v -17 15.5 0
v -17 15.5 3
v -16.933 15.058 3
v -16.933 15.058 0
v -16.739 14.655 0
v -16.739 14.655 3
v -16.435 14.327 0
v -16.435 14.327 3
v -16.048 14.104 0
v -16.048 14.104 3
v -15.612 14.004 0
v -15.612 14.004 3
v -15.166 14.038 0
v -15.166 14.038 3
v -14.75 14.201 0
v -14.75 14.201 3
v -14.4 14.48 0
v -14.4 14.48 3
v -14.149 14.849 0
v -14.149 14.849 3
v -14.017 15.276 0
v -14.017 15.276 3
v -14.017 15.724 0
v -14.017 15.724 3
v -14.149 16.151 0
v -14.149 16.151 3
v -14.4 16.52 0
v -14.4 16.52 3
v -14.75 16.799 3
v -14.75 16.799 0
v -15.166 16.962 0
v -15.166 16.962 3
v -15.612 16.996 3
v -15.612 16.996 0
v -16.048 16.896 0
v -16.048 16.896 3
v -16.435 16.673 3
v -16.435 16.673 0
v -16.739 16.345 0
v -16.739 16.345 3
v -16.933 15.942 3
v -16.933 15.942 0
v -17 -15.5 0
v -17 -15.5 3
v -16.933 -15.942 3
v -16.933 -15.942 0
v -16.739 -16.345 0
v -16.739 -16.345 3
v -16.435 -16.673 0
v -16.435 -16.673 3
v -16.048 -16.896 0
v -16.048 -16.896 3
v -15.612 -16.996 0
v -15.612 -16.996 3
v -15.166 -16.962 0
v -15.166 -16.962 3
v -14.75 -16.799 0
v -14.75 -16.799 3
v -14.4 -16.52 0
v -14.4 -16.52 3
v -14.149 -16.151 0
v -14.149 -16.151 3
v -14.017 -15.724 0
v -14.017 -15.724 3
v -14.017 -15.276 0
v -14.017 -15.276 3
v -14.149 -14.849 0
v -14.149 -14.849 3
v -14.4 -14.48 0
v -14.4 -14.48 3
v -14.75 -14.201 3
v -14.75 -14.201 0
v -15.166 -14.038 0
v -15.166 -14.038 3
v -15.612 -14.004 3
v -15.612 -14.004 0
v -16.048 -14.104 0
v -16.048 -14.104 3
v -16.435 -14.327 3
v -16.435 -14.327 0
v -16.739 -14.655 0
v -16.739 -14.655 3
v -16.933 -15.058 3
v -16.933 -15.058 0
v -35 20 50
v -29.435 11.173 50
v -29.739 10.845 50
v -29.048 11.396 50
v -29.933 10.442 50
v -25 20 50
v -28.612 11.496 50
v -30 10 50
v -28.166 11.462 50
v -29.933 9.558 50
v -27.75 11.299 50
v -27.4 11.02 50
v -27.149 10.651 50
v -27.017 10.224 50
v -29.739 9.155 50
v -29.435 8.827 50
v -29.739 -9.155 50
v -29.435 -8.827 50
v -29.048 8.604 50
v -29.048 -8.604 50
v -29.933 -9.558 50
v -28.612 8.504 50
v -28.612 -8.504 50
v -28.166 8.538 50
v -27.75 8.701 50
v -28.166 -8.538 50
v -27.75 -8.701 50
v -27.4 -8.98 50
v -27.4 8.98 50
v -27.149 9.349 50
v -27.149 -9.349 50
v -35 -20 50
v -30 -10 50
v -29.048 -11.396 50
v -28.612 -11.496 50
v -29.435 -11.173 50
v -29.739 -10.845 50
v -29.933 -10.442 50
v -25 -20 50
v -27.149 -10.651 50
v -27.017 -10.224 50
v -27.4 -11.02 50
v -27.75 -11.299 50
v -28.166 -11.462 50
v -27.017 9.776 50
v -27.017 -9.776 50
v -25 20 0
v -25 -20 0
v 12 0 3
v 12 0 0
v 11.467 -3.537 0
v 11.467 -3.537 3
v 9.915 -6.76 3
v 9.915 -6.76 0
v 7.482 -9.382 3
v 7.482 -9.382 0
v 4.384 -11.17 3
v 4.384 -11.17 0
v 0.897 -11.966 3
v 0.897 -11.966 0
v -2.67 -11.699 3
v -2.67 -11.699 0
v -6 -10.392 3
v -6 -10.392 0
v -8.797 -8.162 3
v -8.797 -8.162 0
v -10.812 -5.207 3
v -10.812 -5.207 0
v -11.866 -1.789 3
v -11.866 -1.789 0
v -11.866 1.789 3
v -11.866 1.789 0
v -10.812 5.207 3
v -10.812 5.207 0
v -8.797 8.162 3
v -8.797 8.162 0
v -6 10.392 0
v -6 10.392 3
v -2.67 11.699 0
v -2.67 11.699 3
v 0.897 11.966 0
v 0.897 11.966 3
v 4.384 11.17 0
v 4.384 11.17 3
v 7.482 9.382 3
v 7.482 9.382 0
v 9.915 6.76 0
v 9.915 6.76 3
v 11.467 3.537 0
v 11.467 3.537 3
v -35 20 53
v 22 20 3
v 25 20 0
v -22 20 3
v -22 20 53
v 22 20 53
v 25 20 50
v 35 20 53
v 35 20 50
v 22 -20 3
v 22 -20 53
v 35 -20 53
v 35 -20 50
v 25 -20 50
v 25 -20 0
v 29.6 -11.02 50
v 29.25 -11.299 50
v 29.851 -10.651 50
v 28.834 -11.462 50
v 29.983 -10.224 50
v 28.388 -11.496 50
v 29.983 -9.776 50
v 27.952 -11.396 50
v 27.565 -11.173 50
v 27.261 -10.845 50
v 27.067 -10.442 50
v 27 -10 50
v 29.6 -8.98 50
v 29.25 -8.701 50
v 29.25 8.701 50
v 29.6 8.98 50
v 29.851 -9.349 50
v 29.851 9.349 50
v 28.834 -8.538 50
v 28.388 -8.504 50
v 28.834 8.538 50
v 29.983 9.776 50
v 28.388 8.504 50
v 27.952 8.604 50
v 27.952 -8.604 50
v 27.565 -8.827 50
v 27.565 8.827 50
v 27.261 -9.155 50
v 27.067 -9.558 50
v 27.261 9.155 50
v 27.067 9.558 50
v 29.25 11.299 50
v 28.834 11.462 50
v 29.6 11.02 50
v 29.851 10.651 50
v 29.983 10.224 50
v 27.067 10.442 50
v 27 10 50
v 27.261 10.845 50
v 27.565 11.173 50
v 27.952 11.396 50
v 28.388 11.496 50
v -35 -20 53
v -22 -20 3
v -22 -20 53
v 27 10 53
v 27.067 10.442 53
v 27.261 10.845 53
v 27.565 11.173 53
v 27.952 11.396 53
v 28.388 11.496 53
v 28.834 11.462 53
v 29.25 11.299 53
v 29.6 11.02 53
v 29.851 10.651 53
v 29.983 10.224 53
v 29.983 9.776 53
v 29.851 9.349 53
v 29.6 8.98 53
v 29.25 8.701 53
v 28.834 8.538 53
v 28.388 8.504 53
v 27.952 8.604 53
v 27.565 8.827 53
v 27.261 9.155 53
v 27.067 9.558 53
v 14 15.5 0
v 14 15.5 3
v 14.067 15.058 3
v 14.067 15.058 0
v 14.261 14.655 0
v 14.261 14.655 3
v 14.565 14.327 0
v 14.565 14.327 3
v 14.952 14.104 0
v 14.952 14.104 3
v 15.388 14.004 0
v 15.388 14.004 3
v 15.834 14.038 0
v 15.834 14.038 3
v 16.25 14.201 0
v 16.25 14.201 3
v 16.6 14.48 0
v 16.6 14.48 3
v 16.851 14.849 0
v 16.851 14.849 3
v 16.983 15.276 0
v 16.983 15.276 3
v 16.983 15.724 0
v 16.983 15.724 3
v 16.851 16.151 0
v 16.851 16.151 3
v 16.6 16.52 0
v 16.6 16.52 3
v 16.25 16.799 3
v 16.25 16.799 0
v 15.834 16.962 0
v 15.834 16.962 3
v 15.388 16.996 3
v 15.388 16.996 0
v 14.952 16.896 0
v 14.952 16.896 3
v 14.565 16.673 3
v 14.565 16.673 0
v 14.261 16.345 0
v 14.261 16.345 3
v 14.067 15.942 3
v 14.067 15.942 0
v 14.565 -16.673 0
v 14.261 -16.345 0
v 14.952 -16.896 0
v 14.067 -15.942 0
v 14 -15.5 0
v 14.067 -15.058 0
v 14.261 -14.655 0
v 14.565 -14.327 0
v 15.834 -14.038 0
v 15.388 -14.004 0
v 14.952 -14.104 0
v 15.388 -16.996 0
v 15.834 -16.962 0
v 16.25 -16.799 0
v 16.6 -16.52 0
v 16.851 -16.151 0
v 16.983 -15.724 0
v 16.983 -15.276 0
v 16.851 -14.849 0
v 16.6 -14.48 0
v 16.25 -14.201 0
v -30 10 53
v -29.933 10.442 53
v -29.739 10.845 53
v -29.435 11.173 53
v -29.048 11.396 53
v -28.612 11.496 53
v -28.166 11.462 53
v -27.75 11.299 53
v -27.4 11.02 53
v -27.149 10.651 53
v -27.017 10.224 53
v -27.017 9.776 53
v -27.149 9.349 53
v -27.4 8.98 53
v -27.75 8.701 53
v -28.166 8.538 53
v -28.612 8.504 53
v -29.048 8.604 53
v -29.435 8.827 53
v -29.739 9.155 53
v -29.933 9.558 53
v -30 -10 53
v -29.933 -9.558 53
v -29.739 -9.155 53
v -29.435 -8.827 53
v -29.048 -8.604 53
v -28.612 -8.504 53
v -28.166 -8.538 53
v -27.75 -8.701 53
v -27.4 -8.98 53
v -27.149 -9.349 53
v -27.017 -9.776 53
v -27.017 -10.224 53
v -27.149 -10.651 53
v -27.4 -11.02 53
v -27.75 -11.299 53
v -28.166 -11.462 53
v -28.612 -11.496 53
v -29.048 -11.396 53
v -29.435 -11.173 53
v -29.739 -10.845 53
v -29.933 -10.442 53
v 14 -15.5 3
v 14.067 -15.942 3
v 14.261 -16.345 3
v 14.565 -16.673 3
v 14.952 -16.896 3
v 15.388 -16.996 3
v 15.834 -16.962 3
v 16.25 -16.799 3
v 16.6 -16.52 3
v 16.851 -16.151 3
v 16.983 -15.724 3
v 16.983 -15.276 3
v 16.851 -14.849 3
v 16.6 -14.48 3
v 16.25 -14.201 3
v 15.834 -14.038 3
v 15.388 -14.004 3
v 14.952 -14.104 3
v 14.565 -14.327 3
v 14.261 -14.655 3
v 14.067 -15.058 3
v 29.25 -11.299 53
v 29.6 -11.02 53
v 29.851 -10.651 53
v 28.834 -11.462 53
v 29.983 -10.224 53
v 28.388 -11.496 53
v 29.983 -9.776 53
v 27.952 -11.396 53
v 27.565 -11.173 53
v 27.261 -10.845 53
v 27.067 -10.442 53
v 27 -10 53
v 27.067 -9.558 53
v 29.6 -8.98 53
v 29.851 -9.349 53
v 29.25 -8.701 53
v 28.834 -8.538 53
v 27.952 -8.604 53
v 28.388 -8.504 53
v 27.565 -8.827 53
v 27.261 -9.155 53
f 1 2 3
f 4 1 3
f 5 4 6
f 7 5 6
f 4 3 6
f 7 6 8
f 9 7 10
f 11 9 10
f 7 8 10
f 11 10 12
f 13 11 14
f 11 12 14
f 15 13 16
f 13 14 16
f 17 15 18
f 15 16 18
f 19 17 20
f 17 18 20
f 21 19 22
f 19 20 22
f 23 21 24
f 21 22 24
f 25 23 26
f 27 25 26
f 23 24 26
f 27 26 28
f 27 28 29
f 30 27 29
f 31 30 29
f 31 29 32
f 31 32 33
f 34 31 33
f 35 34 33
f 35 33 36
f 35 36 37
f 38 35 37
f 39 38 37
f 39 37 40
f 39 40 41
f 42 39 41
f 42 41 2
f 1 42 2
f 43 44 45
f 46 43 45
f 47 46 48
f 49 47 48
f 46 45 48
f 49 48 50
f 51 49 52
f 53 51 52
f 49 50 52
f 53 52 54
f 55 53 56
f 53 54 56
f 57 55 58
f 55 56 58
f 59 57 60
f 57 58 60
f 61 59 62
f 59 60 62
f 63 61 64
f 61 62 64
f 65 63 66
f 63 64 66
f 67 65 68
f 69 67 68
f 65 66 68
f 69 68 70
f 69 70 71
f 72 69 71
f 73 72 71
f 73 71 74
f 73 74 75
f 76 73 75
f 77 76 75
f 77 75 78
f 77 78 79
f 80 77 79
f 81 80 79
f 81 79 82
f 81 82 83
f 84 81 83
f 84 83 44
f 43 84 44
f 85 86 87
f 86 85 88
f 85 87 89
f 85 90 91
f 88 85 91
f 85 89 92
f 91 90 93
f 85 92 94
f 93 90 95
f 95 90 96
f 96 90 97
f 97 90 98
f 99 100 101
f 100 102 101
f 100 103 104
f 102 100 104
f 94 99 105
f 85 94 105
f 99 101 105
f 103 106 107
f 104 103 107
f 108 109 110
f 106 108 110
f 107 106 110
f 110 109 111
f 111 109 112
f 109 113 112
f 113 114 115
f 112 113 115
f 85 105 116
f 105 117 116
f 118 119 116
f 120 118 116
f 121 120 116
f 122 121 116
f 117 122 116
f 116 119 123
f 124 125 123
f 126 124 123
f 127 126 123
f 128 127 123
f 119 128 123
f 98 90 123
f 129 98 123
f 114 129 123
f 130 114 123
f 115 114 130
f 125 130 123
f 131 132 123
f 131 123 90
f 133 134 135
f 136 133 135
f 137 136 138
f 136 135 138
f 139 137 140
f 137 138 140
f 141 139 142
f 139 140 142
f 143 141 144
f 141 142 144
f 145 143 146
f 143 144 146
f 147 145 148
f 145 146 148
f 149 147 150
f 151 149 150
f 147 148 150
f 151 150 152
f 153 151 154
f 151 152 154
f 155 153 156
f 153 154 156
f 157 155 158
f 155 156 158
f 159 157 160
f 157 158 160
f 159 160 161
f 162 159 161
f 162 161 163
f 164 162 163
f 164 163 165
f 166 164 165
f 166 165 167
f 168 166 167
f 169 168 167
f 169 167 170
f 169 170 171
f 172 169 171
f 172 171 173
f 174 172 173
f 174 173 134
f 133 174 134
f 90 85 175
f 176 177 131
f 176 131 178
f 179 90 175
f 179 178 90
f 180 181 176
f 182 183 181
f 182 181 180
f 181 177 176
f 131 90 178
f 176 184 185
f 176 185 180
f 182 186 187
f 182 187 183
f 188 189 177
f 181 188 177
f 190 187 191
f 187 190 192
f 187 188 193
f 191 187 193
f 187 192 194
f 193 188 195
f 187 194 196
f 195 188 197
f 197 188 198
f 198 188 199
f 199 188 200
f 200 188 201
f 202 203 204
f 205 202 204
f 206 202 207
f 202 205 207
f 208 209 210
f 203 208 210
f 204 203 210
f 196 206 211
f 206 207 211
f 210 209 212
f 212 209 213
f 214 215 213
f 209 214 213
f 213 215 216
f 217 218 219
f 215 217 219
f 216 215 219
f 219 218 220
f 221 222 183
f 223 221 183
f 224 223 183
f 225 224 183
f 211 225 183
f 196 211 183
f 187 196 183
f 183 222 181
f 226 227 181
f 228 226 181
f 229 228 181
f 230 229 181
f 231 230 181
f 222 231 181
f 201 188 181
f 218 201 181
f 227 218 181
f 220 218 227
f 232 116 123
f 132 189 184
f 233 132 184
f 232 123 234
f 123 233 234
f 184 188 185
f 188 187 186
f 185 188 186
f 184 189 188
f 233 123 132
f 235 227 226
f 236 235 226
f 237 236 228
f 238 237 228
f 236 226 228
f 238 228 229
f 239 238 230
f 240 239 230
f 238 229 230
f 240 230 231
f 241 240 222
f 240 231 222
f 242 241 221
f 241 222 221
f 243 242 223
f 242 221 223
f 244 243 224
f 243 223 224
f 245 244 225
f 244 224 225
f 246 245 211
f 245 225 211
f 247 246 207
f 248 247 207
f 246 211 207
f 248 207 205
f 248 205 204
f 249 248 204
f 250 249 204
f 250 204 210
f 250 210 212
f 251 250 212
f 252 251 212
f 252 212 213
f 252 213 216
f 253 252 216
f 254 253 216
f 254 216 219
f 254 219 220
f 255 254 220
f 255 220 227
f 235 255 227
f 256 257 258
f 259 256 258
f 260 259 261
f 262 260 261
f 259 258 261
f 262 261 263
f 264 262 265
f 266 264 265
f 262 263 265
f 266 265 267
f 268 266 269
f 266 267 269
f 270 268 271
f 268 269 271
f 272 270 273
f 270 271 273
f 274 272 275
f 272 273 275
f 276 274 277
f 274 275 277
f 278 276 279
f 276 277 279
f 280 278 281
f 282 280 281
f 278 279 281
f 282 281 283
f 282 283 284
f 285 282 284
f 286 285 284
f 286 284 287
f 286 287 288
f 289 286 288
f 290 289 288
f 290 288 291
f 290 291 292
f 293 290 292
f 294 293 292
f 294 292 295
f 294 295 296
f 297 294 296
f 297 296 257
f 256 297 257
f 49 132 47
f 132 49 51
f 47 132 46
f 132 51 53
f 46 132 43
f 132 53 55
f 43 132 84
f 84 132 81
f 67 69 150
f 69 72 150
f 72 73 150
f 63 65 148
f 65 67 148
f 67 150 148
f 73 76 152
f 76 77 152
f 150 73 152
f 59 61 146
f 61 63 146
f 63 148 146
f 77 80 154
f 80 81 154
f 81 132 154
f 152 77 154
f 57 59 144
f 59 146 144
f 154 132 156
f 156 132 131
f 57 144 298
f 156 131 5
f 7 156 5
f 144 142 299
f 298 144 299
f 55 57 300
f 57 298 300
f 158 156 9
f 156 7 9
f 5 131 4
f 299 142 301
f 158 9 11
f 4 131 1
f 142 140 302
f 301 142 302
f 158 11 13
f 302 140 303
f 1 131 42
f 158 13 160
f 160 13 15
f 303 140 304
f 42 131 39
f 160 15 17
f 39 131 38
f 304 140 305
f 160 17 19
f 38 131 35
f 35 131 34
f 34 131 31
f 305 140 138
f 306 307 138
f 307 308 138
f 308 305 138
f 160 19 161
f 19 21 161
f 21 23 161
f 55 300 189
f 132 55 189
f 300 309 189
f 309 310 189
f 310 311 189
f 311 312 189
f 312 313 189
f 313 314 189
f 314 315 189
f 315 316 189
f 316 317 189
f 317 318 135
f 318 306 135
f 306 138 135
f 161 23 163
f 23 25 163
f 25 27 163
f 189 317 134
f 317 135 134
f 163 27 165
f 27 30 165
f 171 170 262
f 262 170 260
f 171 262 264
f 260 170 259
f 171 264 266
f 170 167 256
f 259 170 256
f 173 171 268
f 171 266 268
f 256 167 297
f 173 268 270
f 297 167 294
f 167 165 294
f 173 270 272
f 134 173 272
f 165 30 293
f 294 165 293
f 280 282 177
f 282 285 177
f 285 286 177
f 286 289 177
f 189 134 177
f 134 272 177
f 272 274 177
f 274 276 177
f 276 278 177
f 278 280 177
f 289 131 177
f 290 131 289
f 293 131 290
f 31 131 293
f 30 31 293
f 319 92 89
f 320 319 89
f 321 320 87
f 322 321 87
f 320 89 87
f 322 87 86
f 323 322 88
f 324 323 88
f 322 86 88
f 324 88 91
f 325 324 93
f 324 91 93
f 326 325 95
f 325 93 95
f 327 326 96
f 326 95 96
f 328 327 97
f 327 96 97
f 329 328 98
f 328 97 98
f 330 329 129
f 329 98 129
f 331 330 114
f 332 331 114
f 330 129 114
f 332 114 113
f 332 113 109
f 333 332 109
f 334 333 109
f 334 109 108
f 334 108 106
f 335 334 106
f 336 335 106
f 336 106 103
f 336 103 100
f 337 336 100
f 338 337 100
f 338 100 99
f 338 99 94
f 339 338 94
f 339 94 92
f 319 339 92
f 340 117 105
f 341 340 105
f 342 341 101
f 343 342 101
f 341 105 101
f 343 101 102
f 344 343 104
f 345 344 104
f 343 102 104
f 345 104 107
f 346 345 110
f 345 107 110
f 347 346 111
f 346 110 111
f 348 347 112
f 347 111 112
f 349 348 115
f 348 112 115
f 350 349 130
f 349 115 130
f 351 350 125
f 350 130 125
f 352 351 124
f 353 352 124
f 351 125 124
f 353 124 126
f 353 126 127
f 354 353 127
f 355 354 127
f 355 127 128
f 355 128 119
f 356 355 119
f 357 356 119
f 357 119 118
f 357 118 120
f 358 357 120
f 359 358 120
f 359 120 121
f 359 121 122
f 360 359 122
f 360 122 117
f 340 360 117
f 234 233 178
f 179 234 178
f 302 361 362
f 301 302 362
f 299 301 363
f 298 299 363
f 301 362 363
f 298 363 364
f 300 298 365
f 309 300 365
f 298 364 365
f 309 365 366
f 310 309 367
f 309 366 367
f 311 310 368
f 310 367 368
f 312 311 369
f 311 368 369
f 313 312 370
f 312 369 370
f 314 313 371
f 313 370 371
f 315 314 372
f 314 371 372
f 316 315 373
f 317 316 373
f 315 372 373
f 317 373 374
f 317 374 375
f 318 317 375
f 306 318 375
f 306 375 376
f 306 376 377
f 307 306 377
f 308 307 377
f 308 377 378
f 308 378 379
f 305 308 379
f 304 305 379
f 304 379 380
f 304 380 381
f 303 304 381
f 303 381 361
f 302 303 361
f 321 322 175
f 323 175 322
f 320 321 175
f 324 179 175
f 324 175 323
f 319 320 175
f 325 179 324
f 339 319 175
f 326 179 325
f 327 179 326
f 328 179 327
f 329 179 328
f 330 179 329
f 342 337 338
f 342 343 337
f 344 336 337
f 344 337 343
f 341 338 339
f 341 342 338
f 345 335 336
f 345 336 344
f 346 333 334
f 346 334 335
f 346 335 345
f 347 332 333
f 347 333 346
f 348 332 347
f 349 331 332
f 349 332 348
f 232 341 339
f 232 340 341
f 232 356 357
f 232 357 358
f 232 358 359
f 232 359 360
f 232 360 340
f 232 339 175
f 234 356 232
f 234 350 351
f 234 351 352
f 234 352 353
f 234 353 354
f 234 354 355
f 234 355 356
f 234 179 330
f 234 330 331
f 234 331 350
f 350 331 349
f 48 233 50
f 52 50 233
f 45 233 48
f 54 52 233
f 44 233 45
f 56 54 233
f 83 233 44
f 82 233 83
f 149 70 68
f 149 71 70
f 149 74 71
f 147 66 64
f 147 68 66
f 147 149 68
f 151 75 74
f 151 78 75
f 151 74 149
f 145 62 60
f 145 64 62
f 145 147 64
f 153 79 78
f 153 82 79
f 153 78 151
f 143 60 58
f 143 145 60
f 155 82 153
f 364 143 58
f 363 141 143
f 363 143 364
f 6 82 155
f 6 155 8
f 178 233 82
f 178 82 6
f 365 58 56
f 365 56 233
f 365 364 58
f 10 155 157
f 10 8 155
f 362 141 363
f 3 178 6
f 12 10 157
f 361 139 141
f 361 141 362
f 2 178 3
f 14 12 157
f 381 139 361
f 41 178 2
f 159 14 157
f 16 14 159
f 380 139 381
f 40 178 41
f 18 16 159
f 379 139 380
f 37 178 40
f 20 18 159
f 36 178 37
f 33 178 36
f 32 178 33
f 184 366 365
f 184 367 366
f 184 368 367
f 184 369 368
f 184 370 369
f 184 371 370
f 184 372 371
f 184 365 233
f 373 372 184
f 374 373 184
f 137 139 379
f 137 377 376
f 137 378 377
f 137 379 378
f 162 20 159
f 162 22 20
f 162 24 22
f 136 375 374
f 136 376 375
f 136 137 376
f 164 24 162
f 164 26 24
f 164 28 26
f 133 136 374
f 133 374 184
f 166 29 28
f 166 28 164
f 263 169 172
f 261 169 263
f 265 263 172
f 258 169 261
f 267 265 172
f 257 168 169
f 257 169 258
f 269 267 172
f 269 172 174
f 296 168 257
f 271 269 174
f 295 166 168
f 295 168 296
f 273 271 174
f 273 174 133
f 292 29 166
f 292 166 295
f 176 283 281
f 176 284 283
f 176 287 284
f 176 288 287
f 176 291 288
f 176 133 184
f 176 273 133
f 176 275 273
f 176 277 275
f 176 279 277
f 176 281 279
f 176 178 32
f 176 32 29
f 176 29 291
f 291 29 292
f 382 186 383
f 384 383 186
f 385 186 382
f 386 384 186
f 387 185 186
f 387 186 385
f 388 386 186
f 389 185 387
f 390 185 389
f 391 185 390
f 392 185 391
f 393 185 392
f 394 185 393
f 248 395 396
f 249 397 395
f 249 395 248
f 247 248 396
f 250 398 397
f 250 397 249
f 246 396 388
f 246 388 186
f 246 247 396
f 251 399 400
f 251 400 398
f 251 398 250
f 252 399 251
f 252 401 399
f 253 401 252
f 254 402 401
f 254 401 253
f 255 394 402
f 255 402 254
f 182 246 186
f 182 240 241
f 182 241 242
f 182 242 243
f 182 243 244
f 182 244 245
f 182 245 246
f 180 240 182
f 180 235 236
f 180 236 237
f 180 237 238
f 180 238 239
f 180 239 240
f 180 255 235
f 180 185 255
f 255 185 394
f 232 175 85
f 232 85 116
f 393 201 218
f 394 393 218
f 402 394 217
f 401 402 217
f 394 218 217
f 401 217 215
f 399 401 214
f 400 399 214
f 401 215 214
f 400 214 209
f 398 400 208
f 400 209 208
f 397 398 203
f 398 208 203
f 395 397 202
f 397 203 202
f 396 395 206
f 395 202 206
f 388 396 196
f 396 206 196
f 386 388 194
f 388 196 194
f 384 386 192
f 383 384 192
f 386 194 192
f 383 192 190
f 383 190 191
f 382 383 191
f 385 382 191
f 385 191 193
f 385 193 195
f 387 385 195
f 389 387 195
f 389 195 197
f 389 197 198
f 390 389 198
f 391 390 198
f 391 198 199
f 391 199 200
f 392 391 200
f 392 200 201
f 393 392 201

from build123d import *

# Parameters (mm, degrees)
F0_W      = 50
F0_H      = 40
F1_DEPTH  = 3
F2_W      = 3
F2_H      = 40
F3_DEPTH  = 50
F4_W      = 40
F4_H      = 3
F5_DEPTH  = 10
F6_W      = 40
F6_H      = 3
F7_DEPTH  = 10
F9_D      = 3
F8_R      = 12
F10_DEPTH = 25
F12_D     = 3
F14_D     = 3


with BuildPart() as f1:
    # F0 (on Top) → F1 (new body)
    with BuildSketch(Plane.XY):
        Rectangle(F0_W, F0_H)
    extrude(amount=F1_DEPTH)

    # F2 (on face) → F3 (join)
    with BuildSketch(Plane.XY.offset(3)):
        with Locations((23.5, 0)):
            Rectangle(F2_W, F2_H)
        with Locations((-23.5, 0)):
            Rectangle(F2_W, F2_H)
    extrude(amount=F3_DEPTH)

    # F4 (on face) → F5 (join)
    with BuildSketch(Plane.YZ.offset(25)):
        with Locations((0, 51.5)):
            Rectangle(F4_W, F4_H)
    extrude(amount=F5_DEPTH)

    # F6 (on face) → F7 (join)
    with BuildSketch(Plane(origin=(-25, 0, 0), x_dir=(0, -1, 0), z_dir=(-1, 0, 0))):
        with Locations((0, 51.5)):
            Rectangle(F6_W, F6_H)
    extrude(amount=F7_DEPTH)

    # F9 (through all)
    with Locations(Plane(origin=(0, 0, 0), x_dir=(1, 0, 0), z_dir=(0, 0, -1))):
        with Locations((-15.5, 15.5), (15.5, 15.5), (15.5, -15.5), (-15.5, -15.5)):
            Hole(F9_D / 2)

    # F8 (on face) → F10 (cut)
    with BuildSketch(Plane(origin=(0, 0, 0), x_dir=(1, 0, 0), z_dir=(0, 0, -1))):
        Circle(F8_R)
    extrude(amount=-F10_DEPTH, mode=Mode.SUBTRACT)

    # F12 (through all)
    with Locations(Plane.XY.offset(53)):
        with Locations((-28.5, -10), (-28.5, 10)):
            Hole(F12_D / 2)

    # F14 (through all)
    with Locations(Plane.XY.offset(53)):
        with Locations((28.5, 10), (28.5, -10)):
            Hole(F14_D / 2)


solid = f1.part
